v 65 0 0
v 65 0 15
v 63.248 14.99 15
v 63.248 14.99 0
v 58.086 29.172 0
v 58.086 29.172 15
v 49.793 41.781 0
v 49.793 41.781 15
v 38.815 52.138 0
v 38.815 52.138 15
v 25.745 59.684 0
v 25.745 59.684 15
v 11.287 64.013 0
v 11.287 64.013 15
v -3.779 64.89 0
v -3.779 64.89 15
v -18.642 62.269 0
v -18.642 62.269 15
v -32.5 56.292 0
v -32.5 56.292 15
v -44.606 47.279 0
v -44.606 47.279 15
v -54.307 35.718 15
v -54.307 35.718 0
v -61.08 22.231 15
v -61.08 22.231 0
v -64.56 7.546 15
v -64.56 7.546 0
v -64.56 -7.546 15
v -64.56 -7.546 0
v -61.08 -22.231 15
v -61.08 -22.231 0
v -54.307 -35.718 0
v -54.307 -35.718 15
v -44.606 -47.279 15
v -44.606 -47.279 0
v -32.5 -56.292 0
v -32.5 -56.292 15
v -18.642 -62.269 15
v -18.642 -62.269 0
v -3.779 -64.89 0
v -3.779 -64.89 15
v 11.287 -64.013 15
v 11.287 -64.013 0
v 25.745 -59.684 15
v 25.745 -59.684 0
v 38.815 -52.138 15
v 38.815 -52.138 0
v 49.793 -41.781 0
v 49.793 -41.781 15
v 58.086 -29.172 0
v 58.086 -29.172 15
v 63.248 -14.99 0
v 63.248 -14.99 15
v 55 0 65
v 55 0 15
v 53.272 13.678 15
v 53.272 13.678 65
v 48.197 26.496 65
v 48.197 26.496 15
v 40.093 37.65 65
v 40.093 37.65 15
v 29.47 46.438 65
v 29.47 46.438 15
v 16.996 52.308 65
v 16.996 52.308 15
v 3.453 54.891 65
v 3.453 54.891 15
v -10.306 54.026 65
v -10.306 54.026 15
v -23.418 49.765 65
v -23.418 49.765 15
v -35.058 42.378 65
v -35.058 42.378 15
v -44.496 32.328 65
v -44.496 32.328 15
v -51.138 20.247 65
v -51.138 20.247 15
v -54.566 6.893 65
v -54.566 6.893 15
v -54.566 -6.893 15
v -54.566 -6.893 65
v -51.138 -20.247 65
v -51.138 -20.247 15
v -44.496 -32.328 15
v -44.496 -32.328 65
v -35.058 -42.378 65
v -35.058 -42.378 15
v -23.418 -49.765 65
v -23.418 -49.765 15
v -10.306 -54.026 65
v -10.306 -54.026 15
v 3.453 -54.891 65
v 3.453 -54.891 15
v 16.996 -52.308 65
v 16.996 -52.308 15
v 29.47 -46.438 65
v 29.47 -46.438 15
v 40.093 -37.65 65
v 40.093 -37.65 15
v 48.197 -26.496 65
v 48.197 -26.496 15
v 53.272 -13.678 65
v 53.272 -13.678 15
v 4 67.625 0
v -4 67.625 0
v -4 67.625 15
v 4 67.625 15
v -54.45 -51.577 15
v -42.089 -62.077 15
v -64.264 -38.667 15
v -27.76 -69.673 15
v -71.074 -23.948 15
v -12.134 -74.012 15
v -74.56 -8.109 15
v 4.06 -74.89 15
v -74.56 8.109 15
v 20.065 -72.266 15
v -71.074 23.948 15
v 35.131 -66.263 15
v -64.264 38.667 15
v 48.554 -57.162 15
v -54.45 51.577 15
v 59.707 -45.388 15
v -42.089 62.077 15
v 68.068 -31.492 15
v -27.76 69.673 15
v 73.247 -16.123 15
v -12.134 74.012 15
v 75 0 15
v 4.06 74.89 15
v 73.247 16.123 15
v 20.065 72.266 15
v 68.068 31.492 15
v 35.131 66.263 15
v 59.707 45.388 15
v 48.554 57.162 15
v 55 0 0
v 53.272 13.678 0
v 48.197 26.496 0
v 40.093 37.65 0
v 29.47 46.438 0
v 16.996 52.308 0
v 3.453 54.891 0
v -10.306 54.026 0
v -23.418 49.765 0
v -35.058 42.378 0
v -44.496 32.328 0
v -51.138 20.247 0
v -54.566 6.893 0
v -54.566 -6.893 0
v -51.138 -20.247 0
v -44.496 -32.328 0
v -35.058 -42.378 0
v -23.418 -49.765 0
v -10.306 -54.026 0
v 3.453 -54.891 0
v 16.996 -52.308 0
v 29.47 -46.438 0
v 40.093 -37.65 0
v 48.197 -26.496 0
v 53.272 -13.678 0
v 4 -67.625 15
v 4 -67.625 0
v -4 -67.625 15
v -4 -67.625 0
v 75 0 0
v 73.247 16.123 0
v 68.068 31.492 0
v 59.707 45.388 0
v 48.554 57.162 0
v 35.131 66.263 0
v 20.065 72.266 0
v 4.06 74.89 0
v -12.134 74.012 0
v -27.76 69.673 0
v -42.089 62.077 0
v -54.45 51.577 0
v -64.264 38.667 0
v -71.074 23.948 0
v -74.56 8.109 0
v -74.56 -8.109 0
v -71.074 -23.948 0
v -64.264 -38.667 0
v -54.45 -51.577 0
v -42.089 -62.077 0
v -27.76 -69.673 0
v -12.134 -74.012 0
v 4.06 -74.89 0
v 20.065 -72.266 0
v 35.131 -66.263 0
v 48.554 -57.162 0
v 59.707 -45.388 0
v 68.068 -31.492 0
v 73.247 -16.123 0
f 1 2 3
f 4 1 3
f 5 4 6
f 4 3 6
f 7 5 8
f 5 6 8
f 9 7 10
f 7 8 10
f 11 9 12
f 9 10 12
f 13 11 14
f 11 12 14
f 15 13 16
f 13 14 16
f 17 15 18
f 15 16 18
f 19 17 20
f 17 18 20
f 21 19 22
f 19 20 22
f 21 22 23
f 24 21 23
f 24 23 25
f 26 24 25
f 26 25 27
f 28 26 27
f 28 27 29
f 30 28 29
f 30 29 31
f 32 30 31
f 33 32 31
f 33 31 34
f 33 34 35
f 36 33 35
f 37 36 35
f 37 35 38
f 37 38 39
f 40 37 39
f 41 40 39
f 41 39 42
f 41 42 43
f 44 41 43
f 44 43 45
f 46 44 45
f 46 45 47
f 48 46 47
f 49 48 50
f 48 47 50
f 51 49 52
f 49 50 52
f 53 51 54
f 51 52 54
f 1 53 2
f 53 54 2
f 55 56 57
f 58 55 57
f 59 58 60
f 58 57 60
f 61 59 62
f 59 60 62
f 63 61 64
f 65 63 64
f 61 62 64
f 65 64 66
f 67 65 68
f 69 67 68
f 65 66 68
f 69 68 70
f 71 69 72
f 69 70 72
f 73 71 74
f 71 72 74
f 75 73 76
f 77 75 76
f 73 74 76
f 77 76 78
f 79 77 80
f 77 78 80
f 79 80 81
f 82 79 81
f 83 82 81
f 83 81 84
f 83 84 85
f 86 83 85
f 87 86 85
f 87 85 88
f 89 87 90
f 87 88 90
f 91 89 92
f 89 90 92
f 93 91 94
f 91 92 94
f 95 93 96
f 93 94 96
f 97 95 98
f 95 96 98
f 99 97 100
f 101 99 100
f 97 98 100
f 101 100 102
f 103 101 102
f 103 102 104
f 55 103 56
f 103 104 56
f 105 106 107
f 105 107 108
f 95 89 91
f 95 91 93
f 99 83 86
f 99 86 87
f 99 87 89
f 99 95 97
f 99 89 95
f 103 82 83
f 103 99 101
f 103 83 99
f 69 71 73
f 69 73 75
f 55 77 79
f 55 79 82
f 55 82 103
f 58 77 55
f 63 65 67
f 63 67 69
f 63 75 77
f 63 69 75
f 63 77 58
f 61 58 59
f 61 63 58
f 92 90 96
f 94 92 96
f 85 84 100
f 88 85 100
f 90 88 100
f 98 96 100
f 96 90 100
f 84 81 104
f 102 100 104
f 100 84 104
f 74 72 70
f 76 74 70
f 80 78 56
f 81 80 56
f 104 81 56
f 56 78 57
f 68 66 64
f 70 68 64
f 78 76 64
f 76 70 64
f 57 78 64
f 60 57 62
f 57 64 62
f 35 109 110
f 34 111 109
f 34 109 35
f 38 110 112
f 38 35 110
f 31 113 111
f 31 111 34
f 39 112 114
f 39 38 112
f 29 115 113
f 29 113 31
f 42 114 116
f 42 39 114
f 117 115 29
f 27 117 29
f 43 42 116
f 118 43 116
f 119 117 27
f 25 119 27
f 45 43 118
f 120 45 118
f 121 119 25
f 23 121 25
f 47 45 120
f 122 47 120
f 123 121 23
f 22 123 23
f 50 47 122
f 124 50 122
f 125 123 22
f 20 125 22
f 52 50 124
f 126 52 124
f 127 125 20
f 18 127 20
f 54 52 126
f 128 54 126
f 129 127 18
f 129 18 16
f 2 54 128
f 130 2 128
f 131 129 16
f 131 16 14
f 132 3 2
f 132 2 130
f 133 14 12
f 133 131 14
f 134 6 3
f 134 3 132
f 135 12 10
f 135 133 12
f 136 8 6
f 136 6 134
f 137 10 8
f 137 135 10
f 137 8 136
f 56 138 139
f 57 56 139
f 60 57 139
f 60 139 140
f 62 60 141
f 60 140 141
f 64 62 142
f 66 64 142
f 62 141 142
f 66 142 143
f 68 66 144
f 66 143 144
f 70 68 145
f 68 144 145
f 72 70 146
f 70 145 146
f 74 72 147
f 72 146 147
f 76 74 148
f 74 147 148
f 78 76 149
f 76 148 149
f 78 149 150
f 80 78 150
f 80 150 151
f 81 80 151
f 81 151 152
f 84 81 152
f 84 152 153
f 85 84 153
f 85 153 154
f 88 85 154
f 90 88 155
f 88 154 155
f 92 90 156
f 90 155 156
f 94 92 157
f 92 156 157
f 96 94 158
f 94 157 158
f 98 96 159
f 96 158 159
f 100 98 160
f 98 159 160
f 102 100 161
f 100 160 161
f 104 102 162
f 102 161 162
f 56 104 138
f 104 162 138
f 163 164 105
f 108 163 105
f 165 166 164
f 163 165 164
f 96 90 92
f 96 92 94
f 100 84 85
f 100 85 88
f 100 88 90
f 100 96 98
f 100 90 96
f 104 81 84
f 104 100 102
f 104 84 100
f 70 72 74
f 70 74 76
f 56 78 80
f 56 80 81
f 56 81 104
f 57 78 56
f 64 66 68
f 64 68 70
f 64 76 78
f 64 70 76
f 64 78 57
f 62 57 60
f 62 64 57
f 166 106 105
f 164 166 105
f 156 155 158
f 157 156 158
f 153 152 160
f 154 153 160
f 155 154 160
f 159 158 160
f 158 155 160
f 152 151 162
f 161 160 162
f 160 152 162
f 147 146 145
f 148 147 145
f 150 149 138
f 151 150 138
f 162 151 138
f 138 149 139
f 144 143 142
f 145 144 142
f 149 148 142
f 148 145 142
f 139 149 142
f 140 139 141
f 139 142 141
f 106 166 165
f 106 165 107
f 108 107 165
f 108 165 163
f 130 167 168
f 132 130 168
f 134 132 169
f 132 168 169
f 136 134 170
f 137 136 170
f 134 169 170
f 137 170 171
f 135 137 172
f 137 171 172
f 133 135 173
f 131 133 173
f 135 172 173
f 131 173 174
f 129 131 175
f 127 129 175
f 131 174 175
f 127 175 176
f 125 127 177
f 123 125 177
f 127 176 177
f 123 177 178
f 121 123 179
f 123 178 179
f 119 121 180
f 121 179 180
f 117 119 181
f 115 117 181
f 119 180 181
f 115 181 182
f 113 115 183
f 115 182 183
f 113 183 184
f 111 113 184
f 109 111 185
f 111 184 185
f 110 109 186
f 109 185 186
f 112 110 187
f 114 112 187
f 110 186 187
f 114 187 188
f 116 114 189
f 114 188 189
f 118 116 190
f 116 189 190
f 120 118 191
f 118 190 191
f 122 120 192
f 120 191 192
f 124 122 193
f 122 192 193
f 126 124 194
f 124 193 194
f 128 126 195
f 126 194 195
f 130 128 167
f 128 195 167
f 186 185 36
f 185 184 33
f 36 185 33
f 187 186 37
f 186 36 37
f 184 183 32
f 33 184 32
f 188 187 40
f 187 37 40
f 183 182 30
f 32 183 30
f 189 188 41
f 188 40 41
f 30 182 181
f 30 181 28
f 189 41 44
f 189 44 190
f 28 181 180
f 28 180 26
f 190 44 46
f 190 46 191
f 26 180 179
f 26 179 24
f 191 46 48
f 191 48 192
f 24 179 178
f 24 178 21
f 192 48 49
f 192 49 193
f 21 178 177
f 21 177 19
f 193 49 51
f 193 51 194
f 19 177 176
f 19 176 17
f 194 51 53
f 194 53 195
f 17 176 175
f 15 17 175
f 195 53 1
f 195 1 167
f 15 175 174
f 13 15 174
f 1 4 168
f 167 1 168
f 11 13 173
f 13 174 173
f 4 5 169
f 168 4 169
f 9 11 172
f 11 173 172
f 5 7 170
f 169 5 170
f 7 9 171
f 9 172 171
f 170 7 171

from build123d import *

# Parameters (mm, degrees)
F0_R     = 75
F1_DEPTH = 15
F2_R     = 65
F3_DEPTH = 21.3
F4_R     = 55
F5_DEPTH = 15
F6_W     = 8
F6_H     = 135.2500021458
F7_DEPTH = 15
F8_DEPTH = 50


with BuildPart() as f1:
    # F0 (on Top) → F1 (new body)
    with BuildSketch(Plane.XY):
        Circle(F0_R)
    extrude(amount=F1_DEPTH)

    # F2 (on face) → F3 (cut)
    with BuildSketch(Plane.XY.offset(15)):
        Circle(F2_R)
    extrude(amount=-F3_DEPTH, mode=Mode.SUBTRACT)


with BuildPart() as f5:
    # F4 (on Top) → F5 (new body)
    with BuildSketch(Plane.XY):
        Circle(F4_R)
    extrude(amount=F5_DEPTH)


with BuildPart() as f7:
    # F6 (on Top) → F7 (new body)
    with BuildSketch(Plane.XY):
        Rectangle(F6_W, F6_H)
    extrude(amount=F7_DEPTH)


with BuildPart() as f8:
    # F8 (new): a face of the model
    f8_faces = [f5.part.faces().sort_by_distance(p)[0] for p in [
        (0, 0, 15),
    ]]
    extrude(f8_faces, amount=F8_DEPTH)


solid = Compound([f1.part, f5.part, f7.part, f8.part])
